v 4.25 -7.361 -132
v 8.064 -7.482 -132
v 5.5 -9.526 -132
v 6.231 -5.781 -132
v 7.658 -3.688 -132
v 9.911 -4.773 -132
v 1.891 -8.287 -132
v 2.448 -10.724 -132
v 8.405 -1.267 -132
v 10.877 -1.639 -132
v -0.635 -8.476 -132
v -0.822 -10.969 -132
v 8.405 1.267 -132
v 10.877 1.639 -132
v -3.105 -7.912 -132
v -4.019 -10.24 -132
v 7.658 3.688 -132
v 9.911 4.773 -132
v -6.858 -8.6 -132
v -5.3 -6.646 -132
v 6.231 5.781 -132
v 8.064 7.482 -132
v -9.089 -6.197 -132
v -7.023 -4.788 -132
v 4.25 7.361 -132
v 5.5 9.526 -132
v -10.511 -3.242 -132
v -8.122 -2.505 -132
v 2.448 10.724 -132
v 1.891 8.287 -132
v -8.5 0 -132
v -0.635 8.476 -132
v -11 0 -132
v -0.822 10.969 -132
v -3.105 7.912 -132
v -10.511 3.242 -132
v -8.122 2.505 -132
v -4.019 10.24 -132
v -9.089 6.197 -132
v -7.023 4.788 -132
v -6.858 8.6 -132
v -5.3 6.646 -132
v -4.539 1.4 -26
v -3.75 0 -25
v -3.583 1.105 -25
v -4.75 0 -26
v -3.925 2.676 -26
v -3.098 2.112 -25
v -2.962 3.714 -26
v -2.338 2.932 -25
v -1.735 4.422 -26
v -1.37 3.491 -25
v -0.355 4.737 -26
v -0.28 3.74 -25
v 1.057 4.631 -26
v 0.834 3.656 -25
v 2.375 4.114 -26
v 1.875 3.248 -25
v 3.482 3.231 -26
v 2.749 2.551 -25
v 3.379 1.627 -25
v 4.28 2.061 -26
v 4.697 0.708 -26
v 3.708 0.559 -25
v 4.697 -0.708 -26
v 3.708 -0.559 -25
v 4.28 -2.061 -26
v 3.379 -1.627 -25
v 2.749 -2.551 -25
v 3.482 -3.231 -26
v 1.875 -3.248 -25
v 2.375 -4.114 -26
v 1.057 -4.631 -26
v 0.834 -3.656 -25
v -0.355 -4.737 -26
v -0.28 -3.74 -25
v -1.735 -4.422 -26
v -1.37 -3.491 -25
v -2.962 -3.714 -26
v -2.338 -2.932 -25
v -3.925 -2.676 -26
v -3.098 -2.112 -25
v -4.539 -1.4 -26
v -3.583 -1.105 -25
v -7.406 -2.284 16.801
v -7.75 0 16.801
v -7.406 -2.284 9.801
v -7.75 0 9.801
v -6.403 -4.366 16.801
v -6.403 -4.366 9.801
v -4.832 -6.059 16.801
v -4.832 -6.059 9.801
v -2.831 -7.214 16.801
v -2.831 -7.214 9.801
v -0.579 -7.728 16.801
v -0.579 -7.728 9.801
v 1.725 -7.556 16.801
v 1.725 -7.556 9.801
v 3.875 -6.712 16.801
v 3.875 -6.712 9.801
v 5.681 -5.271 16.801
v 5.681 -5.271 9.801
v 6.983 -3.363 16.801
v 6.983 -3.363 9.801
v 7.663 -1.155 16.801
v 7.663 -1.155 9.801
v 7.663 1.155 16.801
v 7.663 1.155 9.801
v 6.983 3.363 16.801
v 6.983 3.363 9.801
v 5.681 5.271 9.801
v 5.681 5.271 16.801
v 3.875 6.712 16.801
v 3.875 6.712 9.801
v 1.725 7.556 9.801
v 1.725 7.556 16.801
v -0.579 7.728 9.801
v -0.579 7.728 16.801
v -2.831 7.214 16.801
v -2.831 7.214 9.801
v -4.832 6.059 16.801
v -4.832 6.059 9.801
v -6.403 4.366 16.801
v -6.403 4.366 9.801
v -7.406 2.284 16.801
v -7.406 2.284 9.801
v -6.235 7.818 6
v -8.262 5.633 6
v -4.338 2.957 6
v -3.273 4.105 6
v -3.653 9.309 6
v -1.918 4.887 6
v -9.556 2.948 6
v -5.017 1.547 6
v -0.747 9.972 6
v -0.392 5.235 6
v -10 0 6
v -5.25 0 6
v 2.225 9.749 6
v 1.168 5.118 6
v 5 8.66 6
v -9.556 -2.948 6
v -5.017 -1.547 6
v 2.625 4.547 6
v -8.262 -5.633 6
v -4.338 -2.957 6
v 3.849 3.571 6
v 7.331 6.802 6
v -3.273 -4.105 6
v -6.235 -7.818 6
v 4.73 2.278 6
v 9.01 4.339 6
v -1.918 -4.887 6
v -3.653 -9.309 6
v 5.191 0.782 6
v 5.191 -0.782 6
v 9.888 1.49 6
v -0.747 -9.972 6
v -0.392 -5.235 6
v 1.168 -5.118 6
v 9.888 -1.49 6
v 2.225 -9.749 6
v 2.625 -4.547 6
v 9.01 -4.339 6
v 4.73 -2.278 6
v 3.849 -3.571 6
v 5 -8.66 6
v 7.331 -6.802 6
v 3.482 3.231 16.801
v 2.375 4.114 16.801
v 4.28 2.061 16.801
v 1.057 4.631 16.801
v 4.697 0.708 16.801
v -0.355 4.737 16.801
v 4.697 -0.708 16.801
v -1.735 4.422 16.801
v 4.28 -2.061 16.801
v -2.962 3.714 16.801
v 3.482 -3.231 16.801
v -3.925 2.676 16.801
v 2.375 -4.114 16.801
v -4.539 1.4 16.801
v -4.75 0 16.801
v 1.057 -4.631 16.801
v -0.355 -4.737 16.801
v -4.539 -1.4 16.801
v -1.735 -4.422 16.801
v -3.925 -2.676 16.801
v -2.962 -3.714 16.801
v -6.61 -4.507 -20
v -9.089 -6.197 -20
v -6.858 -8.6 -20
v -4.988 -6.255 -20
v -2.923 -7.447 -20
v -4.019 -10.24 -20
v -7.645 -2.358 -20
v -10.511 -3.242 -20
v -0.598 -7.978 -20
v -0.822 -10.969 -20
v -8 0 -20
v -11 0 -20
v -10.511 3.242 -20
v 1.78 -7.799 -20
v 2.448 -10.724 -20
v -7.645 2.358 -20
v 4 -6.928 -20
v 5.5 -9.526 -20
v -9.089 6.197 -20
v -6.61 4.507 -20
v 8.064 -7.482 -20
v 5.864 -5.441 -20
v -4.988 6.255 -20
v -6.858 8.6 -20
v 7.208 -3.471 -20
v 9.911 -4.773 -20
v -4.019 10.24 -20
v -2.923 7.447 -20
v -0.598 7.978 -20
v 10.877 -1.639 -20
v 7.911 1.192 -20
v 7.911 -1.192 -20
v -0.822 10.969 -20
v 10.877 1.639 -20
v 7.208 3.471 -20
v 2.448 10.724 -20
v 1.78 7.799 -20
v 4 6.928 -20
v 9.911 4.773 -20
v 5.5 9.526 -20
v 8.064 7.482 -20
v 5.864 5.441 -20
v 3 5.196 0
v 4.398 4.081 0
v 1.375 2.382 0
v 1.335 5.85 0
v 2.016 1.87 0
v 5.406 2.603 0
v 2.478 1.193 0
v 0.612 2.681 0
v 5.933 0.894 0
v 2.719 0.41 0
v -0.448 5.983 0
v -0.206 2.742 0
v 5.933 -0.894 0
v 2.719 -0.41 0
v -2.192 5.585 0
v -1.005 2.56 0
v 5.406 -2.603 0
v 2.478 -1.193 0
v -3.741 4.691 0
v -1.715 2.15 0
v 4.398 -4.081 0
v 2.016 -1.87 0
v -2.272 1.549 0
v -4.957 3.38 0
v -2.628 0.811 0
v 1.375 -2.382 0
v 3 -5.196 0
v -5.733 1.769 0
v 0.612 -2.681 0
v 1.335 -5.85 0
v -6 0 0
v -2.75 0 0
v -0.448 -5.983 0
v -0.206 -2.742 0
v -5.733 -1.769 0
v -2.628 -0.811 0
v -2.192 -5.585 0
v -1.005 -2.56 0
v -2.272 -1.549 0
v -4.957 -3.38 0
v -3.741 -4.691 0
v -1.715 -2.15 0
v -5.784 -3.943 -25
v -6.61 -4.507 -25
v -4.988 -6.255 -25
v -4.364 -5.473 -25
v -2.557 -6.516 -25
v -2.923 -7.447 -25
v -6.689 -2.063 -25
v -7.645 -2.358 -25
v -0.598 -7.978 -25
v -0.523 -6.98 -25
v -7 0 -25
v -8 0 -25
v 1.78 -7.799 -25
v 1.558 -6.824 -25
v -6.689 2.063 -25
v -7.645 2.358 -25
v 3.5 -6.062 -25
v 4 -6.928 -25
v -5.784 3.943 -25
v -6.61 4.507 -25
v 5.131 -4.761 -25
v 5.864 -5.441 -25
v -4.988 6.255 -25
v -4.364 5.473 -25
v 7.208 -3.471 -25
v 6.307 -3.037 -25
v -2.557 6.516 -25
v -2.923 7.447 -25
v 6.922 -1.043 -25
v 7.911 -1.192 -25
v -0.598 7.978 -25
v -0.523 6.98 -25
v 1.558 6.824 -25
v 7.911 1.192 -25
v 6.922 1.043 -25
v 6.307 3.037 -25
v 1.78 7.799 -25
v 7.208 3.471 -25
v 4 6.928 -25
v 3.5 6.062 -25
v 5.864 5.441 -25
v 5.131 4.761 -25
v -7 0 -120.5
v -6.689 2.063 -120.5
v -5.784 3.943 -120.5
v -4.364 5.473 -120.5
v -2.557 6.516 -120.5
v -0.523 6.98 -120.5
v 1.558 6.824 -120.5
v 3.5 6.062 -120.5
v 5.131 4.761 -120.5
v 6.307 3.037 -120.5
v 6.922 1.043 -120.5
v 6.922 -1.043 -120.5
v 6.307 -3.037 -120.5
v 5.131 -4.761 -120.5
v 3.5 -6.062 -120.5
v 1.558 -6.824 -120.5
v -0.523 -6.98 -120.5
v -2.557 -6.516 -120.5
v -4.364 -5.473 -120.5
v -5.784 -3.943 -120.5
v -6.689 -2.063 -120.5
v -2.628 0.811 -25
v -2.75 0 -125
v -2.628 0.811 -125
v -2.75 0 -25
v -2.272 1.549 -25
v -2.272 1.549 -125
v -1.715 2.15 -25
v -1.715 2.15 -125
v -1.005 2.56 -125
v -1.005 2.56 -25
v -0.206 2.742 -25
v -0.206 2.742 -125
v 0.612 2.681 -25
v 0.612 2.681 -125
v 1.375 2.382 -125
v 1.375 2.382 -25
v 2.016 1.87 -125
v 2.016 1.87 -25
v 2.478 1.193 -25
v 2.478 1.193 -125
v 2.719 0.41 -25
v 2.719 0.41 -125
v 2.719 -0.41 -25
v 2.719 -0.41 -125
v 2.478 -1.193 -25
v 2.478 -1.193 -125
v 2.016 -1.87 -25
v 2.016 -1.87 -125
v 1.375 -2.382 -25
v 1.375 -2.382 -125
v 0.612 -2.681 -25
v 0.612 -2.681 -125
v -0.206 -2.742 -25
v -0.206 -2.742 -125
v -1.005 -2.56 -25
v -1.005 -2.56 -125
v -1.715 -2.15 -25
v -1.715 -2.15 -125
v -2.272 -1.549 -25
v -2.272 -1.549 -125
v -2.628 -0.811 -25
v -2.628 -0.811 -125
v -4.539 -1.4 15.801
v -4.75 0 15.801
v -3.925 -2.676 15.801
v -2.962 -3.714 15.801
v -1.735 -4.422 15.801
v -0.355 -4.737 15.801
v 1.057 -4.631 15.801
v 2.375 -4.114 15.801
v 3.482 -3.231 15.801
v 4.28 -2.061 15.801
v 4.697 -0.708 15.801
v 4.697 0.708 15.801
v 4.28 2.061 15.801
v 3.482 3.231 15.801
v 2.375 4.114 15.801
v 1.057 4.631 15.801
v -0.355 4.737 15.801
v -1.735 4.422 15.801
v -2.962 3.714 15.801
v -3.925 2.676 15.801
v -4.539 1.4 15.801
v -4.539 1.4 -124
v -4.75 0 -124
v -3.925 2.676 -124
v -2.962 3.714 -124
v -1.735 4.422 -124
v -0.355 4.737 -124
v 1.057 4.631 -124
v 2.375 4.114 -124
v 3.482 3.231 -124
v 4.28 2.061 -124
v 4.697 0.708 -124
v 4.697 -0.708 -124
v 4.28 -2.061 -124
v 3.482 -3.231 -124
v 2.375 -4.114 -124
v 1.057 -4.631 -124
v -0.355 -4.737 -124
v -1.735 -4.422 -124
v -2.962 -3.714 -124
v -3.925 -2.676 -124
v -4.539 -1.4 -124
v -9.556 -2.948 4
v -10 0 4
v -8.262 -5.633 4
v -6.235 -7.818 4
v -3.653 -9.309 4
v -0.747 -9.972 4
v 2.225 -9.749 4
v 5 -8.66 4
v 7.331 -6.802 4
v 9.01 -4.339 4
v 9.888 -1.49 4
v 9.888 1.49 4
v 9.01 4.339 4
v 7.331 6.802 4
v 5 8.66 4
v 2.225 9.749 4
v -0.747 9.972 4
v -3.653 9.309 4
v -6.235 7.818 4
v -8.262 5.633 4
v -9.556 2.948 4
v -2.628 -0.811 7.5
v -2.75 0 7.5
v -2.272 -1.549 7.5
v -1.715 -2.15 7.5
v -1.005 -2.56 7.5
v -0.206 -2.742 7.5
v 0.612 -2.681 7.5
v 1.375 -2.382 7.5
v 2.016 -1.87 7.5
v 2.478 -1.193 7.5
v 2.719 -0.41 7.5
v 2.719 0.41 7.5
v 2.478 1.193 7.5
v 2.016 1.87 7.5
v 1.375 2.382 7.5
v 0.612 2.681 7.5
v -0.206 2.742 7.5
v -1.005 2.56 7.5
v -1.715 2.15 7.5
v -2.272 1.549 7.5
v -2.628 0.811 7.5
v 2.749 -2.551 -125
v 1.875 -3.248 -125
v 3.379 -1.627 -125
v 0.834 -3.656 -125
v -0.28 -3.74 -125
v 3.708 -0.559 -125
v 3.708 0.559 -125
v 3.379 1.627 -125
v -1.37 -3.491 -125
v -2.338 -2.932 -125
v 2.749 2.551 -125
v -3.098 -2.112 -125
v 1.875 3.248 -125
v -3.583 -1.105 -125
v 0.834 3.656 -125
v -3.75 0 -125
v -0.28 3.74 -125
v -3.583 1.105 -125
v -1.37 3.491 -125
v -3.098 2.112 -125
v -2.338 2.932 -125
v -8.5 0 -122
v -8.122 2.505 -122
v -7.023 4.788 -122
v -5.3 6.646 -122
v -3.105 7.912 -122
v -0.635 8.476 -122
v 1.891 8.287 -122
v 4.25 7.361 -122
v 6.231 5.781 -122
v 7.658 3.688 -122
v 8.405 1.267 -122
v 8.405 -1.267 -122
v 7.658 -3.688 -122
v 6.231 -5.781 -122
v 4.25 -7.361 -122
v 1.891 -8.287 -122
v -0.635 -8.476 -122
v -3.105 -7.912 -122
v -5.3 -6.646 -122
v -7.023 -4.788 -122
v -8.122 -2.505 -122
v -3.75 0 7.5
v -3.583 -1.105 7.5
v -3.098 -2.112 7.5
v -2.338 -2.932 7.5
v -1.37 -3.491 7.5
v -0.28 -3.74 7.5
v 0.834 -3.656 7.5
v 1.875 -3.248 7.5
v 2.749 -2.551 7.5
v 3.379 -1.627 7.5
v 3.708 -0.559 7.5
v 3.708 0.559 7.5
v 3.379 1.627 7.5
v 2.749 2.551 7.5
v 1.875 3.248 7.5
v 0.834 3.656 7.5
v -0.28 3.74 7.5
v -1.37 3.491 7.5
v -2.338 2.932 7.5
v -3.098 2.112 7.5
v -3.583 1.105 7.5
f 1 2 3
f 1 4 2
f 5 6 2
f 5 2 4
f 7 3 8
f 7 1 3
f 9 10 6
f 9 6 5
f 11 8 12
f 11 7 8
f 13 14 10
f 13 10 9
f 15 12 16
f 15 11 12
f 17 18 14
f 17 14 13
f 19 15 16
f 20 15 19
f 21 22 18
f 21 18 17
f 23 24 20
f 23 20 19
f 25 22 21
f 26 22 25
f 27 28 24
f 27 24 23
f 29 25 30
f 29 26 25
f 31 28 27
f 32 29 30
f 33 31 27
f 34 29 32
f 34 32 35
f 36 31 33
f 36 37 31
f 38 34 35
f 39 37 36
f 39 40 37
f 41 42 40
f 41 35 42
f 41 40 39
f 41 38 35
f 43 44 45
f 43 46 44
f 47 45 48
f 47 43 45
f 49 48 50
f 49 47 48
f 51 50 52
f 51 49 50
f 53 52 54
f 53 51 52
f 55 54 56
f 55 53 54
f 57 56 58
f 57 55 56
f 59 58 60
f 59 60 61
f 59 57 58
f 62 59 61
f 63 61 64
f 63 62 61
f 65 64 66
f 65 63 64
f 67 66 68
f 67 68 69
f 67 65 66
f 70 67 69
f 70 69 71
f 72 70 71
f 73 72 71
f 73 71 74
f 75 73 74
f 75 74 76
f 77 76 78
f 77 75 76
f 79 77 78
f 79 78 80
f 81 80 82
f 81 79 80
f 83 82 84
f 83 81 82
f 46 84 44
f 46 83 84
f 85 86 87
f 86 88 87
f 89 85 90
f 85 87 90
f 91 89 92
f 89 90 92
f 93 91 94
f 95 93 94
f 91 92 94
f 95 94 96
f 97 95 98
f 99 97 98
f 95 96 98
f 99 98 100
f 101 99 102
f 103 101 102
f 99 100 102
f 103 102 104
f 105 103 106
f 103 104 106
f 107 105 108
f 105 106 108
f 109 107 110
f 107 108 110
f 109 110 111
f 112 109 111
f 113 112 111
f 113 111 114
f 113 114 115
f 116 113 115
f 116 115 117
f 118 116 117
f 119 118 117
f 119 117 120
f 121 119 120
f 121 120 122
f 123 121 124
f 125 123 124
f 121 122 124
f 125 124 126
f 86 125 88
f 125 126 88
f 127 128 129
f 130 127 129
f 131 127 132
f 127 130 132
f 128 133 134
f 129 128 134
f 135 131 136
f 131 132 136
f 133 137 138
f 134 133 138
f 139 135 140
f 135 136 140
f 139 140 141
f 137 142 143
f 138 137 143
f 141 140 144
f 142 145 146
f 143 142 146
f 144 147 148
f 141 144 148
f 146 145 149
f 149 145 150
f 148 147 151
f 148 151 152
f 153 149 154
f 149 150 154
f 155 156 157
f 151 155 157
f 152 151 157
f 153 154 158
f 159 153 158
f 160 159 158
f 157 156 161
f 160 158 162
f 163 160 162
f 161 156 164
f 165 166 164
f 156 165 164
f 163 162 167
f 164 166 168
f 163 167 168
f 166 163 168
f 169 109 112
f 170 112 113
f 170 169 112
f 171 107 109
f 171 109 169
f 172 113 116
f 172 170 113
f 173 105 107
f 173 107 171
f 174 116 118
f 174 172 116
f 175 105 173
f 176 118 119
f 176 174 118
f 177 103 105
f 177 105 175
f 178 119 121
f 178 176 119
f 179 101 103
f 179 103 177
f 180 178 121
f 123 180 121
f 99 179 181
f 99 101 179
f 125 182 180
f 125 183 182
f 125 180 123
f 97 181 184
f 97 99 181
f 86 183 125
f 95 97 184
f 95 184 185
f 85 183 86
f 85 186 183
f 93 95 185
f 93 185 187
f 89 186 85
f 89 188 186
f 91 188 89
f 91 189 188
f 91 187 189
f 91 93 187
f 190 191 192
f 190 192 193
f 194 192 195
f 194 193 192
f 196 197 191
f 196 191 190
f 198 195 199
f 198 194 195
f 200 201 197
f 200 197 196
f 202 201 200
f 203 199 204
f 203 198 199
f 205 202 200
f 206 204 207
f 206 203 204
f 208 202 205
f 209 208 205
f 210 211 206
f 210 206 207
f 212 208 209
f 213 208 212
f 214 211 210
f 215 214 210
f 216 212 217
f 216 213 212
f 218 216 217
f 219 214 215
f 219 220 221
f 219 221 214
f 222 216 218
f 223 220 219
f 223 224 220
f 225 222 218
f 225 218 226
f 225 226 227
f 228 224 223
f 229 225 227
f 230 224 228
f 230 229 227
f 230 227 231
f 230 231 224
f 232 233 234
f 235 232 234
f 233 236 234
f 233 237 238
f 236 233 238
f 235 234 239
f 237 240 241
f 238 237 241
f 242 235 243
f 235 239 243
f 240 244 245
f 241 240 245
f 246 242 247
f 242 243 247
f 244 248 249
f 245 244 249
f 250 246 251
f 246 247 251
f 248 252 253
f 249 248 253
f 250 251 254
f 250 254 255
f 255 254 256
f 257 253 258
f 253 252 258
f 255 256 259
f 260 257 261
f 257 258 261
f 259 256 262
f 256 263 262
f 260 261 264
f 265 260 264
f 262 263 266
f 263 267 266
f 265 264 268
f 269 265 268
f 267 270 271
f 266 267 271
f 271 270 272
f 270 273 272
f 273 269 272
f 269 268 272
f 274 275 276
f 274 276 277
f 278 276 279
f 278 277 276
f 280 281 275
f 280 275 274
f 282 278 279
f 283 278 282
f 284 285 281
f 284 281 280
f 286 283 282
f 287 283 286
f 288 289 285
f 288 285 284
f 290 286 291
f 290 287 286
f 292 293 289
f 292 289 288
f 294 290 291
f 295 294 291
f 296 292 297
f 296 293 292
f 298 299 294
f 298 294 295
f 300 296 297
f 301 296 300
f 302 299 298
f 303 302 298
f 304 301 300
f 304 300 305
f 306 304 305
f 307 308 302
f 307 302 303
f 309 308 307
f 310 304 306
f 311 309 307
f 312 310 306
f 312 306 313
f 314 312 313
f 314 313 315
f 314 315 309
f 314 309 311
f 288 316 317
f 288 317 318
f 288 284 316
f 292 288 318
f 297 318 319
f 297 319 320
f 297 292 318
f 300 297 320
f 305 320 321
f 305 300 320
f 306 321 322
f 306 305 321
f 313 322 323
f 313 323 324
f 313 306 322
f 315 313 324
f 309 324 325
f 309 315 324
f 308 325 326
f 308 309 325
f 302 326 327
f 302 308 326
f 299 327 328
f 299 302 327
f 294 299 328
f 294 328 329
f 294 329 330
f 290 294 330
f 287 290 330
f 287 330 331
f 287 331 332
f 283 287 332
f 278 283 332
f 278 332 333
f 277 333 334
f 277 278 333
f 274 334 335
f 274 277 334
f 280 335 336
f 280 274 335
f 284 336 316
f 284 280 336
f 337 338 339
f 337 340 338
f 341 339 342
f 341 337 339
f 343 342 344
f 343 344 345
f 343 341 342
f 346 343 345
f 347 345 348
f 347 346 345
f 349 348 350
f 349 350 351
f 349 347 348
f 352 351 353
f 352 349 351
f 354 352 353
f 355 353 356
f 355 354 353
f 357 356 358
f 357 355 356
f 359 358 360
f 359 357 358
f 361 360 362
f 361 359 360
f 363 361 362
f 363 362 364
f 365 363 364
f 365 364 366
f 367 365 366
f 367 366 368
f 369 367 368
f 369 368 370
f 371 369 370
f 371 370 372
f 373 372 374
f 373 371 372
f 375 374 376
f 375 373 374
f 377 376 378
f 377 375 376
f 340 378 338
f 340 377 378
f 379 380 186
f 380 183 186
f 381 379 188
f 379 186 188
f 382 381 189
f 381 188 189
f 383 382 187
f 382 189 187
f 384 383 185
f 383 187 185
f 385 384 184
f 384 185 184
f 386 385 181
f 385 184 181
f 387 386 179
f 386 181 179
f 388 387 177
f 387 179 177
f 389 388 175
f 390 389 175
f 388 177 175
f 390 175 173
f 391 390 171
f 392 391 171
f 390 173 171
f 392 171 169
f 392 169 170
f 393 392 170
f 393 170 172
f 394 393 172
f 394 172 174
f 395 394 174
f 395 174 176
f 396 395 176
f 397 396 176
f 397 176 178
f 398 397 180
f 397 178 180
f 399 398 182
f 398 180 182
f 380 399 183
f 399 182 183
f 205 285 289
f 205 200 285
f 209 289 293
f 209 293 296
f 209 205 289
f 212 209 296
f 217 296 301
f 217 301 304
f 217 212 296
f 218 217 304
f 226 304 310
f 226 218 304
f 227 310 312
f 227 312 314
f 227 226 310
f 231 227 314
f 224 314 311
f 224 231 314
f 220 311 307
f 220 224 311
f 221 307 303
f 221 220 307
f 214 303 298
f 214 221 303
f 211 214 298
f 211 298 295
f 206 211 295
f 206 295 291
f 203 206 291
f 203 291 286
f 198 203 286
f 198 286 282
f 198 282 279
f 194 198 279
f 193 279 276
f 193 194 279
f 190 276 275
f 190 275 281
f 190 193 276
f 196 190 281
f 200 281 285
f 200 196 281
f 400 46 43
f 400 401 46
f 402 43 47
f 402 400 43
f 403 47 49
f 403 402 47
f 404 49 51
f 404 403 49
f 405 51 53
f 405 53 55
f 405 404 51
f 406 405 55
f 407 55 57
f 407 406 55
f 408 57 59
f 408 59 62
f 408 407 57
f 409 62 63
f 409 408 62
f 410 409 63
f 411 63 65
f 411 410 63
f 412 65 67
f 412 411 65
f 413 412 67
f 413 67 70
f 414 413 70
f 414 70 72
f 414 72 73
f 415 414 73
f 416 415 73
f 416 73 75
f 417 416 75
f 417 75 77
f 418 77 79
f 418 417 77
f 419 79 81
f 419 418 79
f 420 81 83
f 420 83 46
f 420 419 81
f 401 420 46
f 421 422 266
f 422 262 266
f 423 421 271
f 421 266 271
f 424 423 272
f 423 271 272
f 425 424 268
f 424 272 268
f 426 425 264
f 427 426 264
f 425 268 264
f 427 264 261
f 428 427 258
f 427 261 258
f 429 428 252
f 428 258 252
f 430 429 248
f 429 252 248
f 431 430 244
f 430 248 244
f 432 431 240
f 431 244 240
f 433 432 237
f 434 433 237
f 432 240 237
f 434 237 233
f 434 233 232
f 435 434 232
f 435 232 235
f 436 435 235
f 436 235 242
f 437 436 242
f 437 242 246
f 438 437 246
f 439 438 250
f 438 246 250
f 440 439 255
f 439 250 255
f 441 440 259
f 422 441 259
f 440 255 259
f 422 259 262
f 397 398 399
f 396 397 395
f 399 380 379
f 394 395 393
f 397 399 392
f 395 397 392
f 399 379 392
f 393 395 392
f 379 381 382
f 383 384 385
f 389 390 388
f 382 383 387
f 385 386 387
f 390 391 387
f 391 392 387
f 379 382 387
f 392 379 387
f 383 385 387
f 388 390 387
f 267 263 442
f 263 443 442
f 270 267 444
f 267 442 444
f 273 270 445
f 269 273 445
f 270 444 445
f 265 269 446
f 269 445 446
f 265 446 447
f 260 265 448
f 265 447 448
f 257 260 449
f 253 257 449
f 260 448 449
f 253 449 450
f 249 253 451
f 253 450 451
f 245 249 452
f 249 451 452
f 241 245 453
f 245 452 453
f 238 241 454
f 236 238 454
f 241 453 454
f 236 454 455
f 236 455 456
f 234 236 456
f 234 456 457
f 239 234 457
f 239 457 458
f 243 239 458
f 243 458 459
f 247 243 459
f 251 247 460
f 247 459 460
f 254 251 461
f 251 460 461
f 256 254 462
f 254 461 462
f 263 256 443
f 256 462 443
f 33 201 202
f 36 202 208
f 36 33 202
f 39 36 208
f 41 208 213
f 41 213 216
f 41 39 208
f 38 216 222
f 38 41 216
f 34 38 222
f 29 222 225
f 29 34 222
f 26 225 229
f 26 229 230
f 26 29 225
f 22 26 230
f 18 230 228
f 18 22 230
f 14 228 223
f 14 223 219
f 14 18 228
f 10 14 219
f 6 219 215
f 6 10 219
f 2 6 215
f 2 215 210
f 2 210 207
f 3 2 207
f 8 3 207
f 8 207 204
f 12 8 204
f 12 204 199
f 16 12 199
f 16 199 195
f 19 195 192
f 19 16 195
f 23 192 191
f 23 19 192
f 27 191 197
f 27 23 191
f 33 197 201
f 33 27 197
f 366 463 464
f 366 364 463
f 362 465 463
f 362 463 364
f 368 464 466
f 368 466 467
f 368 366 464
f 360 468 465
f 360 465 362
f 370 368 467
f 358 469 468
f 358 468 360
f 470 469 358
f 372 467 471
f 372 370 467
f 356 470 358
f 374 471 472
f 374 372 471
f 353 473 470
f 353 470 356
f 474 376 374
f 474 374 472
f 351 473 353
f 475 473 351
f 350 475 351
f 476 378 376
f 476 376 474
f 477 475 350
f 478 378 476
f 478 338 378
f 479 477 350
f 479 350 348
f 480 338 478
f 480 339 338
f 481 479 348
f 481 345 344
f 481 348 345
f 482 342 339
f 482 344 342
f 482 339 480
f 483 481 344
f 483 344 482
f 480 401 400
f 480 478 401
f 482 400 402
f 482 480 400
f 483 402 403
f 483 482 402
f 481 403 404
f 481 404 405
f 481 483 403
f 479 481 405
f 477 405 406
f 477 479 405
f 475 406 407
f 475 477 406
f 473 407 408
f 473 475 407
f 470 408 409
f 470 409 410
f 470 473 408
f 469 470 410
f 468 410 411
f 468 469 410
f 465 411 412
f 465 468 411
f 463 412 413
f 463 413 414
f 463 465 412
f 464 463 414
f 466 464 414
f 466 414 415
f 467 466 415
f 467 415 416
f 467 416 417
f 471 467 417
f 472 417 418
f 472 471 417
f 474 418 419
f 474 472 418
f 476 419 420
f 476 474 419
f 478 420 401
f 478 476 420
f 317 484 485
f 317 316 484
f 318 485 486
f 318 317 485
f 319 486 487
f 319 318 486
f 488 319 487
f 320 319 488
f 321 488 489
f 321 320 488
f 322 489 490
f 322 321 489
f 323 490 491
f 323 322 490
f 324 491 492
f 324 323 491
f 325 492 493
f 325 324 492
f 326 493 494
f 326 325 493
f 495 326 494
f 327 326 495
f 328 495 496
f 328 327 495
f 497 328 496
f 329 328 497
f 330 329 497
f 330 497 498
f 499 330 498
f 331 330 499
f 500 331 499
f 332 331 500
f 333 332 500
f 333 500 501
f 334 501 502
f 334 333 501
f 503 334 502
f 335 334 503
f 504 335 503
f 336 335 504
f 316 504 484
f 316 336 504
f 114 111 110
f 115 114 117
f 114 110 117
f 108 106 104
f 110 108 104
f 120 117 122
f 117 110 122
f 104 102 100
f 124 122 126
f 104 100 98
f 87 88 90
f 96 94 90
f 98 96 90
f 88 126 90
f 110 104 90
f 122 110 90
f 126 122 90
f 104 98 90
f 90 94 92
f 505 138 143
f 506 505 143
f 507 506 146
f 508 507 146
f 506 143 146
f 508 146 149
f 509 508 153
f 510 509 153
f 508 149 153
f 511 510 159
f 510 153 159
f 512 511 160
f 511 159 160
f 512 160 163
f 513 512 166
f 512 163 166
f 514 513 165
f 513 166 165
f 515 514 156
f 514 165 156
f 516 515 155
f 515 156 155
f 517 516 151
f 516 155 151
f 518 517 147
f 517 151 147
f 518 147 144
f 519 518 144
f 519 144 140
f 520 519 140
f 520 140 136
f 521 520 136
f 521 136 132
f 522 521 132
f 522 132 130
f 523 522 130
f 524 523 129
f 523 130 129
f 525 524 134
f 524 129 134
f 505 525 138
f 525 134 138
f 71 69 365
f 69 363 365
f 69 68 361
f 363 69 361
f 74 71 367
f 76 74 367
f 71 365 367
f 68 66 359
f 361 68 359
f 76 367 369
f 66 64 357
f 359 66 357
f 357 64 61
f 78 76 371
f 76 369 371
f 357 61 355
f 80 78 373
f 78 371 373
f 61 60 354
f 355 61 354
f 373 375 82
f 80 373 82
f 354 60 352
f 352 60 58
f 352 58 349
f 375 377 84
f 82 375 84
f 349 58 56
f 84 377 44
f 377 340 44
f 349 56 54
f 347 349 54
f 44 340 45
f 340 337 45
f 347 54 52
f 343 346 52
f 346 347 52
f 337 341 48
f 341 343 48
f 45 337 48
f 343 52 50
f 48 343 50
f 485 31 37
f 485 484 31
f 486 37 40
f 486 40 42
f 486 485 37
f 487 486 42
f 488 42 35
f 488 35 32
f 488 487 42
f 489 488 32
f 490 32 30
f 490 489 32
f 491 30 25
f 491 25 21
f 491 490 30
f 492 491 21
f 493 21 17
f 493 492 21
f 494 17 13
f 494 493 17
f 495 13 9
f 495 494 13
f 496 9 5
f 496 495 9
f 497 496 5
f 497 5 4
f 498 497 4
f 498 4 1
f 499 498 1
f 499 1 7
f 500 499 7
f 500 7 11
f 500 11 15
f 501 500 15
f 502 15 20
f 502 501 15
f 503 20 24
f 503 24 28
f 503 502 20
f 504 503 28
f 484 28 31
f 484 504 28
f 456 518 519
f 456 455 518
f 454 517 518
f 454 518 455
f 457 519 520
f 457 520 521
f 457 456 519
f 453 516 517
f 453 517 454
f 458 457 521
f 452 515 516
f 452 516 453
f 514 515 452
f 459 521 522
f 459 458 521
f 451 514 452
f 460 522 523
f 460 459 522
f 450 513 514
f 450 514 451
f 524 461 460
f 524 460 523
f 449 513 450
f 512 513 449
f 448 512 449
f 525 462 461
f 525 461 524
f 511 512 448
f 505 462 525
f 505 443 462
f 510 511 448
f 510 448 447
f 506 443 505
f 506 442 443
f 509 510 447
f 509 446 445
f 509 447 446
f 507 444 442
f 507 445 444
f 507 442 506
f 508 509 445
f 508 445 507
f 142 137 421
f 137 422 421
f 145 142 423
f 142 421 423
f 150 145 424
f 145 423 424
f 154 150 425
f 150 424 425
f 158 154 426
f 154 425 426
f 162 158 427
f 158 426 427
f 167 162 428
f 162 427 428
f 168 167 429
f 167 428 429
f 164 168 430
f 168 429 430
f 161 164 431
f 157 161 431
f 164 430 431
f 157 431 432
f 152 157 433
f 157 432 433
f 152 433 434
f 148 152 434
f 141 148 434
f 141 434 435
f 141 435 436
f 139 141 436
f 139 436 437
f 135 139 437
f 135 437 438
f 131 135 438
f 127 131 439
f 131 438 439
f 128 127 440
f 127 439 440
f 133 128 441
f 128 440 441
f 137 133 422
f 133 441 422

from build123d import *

# Parameters (mm, degrees)
F0_W    = 1
F0_H    = 1.5
F2_W    = 1
F2_H    = 100
F6_SIZE = 1.49999
F7_W    = 3
F7_H    = 1


# Not quite as in the source:
# - a fillet or chamfer is up to 0.001 mm smaller than in the source, because OpenCascade refuses the exact size


with BuildPart() as f1:
    # F0 (on Front) → F1 (revolve)
    with BuildSketch(Plane.XZ):
        Polygon((-6, 0), (-2.75, 0), (-2.75, 6), (-3.75, 6), (-10, 6), (-10, 4), align=None)
        with Locations((-3.25, 6.75)):
            Rectangle(F0_W, F0_H)
    revolve(axis=Axis((0, 0, 7.7176861543), (0, 0, 1)))

    # F6 (size 1.5 in the source; OpenCascade refuses exactly that, so slightly less here)
    f6_edges = [f1.edges().sort_by_distance(p)[0] for p in [
        (3.75, 0, 6),
    ]]
    chamfer(f6_edges, length=F6_SIZE)


with BuildPart() as f3:
    # F2 (on Front) → F3 (revolve)
    with BuildSketch(Plane.XZ):
        with Locations((-3.25, -75)):
            Rectangle(F2_W, F2_H)
        Polygon((-4.75, -124), (-3.75, -125), (-3.75, -25), (-4.75, -26), align=None)
    revolve(axis=Axis((0, 0, -10.3056698131), (0, 0, -1)))


with BuildPart() as f5:
    # F4 (on Front) → F5 (revolve)
    with BuildSketch(Plane.XZ):
        Polygon((-8, -20), (-11, -20), (-11, -132), (-8.5, -132), (-8.5, -122), (-7, -120.5), (-7, -25), (-8, -25), align=None)
    revolve(axis=Axis((0, 0, -133.877441287), (0, 0, -1)))


with BuildPart() as f8:
    # F7 (on Front) → F8 (revolve)
    with BuildSketch(Plane.XZ):
        with Locations((-6.25, 16.3010139478)):
            Rectangle(F7_W, F7_H)
        Polygon((-7.75, 9.8010139478), (0, 9.8010139478), (0, 15.8010139478), (-4.75, 15.8010139478), (-7.75, 15.8010139478), align=None)
    revolve(axis=Axis((0, 0, 9.0013529551), (0, 0, 1)))


solid = Compound([f1.part, f3.part, f5.part, f8.part])
